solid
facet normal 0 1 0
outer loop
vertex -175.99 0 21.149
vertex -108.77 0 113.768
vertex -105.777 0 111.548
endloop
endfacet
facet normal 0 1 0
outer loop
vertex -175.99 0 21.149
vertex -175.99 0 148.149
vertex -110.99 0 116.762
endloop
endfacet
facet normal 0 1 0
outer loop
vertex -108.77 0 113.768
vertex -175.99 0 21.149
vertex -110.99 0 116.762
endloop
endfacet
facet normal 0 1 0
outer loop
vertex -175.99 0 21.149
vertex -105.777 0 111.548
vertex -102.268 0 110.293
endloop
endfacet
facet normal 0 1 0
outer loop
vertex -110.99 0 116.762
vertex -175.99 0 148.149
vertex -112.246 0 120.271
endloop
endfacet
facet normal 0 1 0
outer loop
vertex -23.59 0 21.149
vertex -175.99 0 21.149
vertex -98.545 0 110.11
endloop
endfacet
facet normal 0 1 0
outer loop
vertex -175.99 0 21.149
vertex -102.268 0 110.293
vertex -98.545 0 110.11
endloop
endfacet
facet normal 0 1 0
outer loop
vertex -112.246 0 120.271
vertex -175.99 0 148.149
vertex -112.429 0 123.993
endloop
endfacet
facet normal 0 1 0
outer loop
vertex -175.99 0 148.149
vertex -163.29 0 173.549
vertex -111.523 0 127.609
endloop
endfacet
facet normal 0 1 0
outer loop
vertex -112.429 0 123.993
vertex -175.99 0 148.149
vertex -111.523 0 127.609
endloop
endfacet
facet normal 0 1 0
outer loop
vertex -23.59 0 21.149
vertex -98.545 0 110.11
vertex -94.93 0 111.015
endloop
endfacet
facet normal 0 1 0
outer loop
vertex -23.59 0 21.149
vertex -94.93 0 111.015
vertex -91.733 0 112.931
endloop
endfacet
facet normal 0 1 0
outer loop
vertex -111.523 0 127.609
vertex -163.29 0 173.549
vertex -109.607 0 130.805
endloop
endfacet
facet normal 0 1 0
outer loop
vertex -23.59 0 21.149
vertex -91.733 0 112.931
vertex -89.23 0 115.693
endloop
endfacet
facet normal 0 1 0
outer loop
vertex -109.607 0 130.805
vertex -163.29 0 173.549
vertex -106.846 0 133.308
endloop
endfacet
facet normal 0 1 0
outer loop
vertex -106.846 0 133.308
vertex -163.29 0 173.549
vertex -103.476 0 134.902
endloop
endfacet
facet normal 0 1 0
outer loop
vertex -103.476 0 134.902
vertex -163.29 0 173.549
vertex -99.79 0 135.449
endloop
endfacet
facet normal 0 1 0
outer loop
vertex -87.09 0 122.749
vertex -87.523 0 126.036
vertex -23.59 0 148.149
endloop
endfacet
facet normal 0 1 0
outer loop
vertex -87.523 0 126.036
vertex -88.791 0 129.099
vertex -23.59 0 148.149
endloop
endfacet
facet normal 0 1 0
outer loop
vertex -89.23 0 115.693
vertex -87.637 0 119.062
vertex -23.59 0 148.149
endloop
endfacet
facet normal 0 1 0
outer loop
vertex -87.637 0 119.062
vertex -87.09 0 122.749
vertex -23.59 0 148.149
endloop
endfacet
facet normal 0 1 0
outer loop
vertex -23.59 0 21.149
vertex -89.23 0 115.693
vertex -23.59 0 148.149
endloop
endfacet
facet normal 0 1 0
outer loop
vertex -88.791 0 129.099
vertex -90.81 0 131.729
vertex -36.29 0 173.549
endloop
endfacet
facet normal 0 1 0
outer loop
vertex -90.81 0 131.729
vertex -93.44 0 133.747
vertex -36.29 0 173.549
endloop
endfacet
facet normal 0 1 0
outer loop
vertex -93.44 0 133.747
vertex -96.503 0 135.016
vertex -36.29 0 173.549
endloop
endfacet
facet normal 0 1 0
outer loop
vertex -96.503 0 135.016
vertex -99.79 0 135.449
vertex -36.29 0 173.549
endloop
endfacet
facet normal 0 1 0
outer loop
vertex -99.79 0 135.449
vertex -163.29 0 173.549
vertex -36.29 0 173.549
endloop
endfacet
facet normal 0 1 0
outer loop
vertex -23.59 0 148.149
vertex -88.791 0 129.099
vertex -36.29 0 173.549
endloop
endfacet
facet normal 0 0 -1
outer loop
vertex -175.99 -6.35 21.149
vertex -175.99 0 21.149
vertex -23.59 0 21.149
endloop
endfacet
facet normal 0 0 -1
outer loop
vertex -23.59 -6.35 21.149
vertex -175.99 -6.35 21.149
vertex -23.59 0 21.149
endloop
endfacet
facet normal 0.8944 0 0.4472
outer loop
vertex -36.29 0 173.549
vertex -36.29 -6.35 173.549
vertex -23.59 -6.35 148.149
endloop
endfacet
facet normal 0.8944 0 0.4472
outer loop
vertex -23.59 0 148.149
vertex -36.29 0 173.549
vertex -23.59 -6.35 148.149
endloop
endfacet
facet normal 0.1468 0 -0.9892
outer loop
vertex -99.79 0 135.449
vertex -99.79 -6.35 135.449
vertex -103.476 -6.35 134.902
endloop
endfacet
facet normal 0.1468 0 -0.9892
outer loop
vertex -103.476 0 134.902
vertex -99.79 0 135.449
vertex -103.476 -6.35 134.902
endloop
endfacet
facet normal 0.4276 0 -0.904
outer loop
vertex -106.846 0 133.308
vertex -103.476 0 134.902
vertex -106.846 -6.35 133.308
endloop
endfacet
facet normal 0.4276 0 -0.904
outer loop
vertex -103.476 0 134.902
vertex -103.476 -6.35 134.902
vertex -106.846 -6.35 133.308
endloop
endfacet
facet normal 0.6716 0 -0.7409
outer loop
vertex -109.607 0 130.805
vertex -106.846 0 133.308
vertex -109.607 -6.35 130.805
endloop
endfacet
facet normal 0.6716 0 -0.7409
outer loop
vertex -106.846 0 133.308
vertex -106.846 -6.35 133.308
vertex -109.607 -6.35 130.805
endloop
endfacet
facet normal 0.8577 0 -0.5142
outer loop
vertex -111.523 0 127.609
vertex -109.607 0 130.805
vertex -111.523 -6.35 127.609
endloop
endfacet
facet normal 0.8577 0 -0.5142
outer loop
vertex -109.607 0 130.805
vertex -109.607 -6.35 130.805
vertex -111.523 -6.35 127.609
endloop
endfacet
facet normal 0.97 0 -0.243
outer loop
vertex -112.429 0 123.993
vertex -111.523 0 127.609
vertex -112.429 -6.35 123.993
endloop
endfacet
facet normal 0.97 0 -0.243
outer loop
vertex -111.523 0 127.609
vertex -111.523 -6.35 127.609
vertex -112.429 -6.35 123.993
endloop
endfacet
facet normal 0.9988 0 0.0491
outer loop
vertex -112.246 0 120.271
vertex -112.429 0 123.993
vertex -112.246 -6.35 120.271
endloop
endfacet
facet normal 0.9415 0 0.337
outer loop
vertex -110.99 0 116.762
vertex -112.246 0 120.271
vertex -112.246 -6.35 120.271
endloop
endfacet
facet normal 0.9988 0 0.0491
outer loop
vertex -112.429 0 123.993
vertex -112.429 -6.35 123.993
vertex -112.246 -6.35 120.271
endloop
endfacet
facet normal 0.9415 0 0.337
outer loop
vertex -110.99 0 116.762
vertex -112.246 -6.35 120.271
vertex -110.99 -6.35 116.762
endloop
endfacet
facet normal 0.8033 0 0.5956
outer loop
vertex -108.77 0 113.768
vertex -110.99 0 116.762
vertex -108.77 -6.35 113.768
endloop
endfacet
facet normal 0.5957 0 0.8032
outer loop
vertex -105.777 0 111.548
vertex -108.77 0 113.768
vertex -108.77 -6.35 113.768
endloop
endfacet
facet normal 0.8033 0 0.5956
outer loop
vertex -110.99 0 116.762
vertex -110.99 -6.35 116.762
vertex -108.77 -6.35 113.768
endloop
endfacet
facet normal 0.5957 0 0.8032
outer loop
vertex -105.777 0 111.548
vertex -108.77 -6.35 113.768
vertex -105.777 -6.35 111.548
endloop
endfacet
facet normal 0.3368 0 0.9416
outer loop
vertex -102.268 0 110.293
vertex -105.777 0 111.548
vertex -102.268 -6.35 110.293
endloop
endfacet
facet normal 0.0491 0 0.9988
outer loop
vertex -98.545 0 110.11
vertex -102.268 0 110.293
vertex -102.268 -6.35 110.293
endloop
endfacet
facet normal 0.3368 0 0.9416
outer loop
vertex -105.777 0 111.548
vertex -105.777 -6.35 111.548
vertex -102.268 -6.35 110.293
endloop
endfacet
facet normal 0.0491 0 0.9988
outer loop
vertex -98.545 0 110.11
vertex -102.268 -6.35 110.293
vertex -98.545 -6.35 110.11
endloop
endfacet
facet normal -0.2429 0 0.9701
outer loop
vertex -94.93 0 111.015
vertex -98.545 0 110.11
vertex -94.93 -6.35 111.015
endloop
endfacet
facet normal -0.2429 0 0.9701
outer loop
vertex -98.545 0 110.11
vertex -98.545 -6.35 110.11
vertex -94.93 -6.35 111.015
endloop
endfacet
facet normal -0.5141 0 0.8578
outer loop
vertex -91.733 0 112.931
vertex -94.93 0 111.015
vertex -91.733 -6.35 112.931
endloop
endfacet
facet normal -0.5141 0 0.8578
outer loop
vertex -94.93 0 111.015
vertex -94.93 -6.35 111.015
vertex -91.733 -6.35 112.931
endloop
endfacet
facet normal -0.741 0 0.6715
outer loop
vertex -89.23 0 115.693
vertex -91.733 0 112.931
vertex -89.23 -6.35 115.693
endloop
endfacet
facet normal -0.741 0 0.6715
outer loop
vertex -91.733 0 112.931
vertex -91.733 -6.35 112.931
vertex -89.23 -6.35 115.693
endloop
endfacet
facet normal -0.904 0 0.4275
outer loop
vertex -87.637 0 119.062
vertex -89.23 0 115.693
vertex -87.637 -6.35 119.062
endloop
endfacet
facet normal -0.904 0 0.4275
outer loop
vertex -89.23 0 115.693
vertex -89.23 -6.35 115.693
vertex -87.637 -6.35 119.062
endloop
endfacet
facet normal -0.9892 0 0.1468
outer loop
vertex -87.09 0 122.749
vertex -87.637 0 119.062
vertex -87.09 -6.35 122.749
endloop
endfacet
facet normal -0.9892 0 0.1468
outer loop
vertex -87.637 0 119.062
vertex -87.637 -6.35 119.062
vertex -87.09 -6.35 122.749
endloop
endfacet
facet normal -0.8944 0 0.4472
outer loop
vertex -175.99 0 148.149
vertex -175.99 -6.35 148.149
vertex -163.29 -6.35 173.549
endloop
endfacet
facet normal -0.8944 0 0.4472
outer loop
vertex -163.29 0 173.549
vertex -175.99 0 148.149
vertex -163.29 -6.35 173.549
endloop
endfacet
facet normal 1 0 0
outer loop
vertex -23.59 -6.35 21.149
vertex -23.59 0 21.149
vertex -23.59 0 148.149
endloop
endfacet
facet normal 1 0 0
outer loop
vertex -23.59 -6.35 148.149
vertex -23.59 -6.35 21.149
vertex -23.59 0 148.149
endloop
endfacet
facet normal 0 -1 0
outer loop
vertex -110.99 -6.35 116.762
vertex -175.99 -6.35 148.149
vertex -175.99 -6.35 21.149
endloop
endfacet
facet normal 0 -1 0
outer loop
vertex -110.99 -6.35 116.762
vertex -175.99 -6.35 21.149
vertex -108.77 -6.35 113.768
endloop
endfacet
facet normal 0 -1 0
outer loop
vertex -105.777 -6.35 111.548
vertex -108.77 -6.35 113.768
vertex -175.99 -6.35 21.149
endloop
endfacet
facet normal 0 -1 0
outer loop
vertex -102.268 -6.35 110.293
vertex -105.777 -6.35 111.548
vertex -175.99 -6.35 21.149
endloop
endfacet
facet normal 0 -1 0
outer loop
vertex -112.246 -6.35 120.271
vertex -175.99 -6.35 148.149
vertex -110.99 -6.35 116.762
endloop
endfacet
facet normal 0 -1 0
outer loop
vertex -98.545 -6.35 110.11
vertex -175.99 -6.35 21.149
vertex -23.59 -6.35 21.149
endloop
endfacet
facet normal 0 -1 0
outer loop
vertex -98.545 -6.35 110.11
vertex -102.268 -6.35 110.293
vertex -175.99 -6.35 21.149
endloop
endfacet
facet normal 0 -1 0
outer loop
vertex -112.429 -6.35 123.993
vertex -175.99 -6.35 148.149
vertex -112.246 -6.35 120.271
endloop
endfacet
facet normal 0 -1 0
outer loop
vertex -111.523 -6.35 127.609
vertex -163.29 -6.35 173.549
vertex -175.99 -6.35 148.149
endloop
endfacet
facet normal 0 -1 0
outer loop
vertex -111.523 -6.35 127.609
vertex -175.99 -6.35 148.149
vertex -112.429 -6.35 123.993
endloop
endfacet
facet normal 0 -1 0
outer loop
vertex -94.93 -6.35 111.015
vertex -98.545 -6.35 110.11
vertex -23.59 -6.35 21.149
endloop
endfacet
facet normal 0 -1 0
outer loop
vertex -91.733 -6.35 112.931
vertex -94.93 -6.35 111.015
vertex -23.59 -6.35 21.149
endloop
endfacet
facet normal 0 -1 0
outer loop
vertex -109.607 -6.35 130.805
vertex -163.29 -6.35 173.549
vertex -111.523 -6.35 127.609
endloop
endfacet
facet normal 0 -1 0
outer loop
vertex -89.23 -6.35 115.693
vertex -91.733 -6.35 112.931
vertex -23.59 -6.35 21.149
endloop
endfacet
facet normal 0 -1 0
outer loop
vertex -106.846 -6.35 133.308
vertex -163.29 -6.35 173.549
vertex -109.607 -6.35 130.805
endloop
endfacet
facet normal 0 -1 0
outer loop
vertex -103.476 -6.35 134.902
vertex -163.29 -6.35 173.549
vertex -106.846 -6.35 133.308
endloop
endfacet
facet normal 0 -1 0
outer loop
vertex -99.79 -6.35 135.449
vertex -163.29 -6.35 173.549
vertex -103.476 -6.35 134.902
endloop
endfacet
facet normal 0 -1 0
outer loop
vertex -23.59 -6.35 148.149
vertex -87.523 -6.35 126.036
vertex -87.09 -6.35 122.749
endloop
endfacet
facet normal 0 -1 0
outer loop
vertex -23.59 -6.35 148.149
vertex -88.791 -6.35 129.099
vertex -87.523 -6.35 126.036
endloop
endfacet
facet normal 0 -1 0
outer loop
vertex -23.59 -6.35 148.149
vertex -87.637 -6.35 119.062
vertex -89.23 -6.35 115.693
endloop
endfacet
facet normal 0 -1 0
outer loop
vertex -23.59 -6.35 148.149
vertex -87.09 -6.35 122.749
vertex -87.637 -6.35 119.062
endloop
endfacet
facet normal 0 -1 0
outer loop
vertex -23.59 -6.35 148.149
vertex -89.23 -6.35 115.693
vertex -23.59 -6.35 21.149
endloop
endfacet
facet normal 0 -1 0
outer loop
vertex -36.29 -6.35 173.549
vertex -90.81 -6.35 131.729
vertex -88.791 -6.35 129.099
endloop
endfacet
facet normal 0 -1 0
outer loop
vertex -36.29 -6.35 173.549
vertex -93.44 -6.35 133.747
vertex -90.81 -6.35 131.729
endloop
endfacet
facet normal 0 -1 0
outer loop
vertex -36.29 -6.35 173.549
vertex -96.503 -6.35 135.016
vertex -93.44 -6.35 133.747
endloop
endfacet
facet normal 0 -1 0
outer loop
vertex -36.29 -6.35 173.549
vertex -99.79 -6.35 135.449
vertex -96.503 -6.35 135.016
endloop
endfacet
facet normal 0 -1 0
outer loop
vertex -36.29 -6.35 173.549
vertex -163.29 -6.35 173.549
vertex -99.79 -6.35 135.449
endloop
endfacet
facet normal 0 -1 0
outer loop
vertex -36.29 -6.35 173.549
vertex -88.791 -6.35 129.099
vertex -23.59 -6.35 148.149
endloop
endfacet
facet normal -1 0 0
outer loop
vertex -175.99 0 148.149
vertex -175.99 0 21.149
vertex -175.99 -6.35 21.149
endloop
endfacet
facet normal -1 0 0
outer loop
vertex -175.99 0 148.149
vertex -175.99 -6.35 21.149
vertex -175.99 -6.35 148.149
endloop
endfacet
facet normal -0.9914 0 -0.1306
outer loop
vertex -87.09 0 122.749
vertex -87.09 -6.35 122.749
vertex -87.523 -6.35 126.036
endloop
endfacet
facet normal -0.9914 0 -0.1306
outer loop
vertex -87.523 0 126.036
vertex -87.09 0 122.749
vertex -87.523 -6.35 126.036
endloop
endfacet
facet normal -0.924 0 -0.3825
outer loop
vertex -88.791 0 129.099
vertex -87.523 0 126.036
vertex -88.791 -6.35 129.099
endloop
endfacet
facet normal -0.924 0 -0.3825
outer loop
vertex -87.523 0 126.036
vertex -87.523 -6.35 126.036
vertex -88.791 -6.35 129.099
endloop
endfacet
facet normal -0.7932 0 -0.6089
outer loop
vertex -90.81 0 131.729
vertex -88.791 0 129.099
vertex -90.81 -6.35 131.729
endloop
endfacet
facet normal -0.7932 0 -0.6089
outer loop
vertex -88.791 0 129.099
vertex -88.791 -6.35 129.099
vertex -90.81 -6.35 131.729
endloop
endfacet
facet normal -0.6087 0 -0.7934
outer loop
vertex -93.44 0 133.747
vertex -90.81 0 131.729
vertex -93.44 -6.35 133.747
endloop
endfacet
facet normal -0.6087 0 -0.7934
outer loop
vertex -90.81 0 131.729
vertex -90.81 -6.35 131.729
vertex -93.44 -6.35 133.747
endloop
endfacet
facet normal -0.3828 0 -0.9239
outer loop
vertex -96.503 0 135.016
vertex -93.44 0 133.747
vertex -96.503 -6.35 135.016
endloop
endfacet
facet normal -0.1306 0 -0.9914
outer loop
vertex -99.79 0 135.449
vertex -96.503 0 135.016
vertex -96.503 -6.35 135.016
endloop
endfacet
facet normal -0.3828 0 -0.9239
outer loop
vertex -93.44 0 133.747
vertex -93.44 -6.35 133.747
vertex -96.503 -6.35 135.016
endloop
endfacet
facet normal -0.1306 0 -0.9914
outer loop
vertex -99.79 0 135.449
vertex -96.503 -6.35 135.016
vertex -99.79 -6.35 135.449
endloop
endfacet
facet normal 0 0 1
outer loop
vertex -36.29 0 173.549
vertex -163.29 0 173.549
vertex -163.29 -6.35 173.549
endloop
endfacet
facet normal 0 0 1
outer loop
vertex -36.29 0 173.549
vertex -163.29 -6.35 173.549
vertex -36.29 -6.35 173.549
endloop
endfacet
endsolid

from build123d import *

# Parameters (mm, degrees)
F0_W     = 152.4
F0_H     = 152.4
F1_DEPTH = 6.35
F3_DEPTH = 25.4
F5_DEPTH = 25.4


with BuildPart() as f1:
    # F0 (on Front) → F1 (new body)
    with BuildSketch(Plane.XZ):
        with Locations((-99.789874, 97.348559)):
            Rectangle(F0_W, F0_H)
    extrude(amount=F1_DEPTH)

    # F2 (on face) → F3 (cut)
    with BuildSketch(Plane.XZ.offset(6.35)):
        Polygon((-163.289874, 173.548559), (-175.989874, 173.548559), (-175.989874, 148.148559), align=None)
        Polygon((-23.589874, 173.548559), (-36.289874, 173.548559), (-23.589874, 148.148559), align=None)
    extrude(amount=-F3_DEPTH, mode=Mode.SUBTRACT)

    # F4 (on face) → F5 (cut)
    with BuildSketch(Plane.XZ.offset(6.35)):
        with BuildLine():
            ThreePointArc((-87.089874, 122.748559), (-90.809618, 131.728815), (-99.789874, 135.448559))
            ThreePointArc((-99.789874, 135.448559), (-108.77013, 113.768303), (-87.089874, 122.748559))
        make_face()
    extrude(amount=-F5_DEPTH, mode=Mode.SUBTRACT)


solid = f1.part
